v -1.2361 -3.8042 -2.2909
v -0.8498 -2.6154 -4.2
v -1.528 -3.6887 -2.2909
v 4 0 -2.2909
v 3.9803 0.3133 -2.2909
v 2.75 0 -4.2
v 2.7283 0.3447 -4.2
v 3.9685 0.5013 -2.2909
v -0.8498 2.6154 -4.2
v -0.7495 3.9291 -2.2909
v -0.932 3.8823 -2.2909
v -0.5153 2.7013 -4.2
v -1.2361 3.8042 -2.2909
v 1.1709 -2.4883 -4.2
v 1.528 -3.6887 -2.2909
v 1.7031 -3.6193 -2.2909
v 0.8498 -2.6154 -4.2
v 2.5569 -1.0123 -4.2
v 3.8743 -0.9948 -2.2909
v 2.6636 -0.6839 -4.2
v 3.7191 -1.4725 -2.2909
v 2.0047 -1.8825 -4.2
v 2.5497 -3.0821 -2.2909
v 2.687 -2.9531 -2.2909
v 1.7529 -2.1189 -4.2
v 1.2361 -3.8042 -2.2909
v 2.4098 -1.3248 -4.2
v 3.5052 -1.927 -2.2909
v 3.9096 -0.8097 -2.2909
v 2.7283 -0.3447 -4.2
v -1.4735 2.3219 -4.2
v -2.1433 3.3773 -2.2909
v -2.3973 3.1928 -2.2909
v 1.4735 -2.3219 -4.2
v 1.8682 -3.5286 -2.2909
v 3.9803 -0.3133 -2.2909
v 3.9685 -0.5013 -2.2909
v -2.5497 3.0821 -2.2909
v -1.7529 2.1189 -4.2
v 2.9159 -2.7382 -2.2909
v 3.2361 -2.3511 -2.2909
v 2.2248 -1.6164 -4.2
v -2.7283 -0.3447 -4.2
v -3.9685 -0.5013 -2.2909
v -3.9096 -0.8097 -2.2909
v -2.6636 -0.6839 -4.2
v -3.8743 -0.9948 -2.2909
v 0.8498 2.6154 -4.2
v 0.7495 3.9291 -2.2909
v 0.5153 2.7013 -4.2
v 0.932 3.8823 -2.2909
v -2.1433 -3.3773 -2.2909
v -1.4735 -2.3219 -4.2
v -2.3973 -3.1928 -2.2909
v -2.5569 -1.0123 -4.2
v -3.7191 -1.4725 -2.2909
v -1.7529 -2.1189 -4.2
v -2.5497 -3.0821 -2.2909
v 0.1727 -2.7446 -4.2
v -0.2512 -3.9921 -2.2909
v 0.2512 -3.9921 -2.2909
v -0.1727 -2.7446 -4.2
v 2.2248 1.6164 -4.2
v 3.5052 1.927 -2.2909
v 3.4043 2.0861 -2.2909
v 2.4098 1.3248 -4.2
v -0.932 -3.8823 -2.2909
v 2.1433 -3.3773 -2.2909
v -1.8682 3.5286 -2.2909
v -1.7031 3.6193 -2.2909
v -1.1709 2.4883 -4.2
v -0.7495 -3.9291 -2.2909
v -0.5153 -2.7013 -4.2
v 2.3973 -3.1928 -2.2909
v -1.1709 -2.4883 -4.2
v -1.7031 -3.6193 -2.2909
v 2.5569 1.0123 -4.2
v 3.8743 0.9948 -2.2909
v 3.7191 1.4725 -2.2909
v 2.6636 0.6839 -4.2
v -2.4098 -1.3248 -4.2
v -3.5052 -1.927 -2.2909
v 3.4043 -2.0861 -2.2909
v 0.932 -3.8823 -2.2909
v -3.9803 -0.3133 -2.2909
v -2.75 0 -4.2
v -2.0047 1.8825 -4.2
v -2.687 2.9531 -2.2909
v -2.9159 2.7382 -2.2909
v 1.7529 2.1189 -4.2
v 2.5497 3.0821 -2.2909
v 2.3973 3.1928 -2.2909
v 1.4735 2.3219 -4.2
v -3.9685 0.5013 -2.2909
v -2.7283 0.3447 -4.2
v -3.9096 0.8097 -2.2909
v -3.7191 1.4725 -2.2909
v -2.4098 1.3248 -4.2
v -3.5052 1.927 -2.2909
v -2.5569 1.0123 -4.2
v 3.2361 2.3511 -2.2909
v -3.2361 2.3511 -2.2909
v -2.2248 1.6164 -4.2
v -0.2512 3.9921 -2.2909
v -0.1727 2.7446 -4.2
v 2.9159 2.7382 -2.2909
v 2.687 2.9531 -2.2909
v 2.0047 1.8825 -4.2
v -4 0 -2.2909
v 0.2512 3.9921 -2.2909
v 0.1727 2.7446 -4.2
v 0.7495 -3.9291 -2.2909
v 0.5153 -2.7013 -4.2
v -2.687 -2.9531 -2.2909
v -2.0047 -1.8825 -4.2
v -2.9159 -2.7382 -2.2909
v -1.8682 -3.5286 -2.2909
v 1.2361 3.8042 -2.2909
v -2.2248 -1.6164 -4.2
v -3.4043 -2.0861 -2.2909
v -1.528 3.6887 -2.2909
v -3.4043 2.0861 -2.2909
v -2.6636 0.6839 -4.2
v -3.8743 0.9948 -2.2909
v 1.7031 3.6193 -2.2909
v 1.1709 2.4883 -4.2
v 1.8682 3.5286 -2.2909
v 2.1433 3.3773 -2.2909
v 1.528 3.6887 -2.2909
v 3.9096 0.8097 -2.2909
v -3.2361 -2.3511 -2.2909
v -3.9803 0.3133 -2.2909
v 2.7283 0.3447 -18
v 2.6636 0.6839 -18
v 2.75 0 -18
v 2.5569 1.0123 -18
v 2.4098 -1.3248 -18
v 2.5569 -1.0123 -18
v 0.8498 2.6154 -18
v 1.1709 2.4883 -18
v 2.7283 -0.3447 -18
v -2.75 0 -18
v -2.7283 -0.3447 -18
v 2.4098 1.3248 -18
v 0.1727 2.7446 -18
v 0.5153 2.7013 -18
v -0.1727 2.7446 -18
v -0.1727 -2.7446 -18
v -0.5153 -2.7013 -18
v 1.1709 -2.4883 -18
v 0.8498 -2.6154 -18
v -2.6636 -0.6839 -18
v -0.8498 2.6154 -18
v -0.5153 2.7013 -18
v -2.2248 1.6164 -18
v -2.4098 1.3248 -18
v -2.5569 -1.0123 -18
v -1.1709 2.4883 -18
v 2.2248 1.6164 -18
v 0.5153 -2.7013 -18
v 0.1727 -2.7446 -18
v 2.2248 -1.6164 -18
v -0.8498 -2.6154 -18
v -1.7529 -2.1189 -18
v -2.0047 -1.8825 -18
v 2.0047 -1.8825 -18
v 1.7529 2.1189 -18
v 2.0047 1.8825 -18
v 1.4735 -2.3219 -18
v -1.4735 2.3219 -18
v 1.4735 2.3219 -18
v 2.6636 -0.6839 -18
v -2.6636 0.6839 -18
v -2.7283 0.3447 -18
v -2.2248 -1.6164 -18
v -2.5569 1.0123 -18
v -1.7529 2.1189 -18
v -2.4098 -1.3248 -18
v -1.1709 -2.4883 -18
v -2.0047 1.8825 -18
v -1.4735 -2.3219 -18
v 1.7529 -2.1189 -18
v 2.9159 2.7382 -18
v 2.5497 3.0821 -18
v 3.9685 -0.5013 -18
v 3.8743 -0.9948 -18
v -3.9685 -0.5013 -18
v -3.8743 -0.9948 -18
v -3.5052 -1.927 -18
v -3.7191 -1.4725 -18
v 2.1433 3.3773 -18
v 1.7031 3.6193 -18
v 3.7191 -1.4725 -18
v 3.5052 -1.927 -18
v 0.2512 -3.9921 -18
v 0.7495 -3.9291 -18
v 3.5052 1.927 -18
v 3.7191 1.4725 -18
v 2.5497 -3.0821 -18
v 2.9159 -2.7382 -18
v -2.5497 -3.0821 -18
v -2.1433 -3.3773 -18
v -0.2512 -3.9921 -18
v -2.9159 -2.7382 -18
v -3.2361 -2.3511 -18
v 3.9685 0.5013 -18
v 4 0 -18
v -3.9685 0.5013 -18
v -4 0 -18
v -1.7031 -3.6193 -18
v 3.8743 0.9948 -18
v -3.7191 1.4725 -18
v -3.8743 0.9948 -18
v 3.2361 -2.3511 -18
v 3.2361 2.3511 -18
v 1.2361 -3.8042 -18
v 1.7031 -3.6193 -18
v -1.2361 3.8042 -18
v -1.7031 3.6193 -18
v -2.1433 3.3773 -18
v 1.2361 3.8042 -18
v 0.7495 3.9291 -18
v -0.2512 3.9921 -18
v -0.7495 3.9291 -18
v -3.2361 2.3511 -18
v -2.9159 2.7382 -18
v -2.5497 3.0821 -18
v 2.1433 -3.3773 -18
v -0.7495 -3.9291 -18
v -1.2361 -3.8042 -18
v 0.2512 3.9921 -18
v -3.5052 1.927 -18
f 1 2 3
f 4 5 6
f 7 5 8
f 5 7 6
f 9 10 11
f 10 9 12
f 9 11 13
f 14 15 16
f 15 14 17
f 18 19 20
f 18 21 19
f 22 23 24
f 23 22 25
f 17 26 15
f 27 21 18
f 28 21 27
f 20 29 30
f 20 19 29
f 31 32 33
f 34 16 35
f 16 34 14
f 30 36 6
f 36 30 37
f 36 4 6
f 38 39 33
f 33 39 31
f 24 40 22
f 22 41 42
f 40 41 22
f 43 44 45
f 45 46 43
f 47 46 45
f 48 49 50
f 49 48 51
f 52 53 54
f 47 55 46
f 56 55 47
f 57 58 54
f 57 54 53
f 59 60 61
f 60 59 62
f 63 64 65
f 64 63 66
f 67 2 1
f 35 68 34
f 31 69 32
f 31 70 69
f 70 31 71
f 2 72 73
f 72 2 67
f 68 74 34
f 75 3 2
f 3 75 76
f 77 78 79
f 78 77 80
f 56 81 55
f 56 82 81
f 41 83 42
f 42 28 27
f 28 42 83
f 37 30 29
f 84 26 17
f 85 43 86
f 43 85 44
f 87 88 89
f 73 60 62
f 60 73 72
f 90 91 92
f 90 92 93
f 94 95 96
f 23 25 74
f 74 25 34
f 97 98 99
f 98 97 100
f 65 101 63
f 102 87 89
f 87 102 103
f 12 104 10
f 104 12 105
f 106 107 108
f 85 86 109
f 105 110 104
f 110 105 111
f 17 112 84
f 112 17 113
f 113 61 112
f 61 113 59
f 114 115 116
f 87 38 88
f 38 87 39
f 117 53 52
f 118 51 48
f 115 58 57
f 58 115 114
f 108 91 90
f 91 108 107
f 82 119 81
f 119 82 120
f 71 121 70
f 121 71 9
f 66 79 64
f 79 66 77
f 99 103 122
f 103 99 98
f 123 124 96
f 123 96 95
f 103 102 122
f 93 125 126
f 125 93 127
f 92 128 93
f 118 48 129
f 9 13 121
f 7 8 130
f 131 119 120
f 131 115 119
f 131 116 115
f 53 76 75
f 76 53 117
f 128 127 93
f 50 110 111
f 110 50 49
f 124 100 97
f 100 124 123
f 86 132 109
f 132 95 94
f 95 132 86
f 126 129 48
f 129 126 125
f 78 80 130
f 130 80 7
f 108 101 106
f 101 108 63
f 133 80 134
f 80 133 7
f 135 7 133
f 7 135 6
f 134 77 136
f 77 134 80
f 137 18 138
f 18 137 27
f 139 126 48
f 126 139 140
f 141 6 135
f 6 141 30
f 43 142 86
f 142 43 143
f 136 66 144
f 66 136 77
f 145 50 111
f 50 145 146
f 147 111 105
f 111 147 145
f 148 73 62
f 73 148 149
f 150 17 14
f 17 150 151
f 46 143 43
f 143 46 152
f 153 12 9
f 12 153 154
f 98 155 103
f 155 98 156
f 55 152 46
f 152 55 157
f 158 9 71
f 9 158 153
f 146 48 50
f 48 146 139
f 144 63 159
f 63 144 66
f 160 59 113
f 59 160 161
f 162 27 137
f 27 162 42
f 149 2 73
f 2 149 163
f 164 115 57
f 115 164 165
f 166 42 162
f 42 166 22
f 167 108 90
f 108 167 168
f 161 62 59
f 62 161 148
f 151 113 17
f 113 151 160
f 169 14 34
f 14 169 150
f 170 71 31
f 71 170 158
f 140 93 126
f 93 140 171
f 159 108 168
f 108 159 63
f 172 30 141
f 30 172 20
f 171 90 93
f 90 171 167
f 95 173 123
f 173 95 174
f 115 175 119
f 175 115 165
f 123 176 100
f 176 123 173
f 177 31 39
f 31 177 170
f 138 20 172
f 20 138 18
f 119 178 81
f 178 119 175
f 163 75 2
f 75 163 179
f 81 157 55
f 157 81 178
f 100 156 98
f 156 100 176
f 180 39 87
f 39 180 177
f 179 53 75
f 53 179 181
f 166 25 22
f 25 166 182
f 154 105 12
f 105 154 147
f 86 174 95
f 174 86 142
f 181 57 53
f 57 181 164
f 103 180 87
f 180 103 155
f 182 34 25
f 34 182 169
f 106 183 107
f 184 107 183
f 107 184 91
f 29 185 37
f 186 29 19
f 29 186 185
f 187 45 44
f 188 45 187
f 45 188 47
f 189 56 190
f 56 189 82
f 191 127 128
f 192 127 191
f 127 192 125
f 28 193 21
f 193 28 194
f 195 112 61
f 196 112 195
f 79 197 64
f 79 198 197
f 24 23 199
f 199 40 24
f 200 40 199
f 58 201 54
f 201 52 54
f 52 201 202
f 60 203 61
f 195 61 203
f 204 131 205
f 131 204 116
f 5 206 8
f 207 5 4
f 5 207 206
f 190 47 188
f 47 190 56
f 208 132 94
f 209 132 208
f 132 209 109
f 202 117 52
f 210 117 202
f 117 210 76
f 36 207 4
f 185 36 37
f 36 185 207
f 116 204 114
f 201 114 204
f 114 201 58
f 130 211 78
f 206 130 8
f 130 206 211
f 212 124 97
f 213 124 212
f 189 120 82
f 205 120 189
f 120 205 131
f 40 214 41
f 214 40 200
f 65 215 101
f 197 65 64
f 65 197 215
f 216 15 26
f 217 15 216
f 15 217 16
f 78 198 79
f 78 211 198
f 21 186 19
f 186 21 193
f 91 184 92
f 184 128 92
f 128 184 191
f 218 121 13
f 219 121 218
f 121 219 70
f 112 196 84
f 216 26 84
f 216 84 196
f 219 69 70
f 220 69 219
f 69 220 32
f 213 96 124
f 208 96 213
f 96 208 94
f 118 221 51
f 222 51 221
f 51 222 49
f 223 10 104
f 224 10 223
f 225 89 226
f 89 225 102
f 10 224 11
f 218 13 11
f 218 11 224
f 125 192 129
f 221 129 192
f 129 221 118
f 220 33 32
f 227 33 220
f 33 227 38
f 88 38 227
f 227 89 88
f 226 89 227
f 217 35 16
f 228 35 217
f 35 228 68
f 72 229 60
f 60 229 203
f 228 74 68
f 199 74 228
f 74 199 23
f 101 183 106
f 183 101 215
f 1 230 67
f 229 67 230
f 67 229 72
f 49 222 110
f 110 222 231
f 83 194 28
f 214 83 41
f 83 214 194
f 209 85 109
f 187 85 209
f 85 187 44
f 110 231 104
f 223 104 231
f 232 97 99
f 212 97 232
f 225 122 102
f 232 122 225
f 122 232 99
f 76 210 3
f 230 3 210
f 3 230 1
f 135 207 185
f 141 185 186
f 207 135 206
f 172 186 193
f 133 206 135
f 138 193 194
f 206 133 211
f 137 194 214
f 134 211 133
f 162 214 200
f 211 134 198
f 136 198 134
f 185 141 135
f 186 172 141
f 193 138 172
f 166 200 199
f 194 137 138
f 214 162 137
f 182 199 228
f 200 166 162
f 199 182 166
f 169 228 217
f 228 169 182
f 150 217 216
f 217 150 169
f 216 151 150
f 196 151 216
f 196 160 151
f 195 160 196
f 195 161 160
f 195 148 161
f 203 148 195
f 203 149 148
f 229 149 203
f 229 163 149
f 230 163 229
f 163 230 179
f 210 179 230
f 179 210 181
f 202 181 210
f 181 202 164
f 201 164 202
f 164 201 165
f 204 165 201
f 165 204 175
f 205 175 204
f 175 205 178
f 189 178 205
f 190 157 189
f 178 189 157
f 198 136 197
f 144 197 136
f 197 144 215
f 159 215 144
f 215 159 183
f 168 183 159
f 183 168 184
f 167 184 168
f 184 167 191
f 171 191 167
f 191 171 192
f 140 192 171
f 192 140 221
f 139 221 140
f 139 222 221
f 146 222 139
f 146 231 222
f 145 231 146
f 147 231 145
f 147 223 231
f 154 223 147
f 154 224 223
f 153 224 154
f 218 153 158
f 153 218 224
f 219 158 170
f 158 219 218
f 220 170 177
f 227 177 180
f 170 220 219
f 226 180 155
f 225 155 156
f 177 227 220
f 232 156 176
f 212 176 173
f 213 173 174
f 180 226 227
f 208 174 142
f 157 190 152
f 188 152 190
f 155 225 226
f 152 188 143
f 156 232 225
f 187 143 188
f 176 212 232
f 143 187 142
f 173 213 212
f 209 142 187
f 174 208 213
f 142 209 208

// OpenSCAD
$fn = 50;

difference() {
	union() {
		translate(v = [0, 0, -18.0]) {
			cylinder(h = 21, r = 4.0);
		}
	}
	union() {
		translate(v = [0, 0, 0]) {
			rotate(a = [0, 0, 0]) {
				difference() {
					union() {
						translate(v = [0, 0, -21.0]) {
							cylinder(h = 21, r = 2.25);
						}
						translate(v = [0, 0, -4.2]) {
							cylinder(h = 4.2, r1 = 2.75, r2 = 5.5);
						}
						translate(v = [0, 0, -21.0]) {
							cylinder(h = 21, r = 2.75);
						}
						translate(v = [0, 0, -21.0]) {
							cylinder(h = 21, r = 2.25);
						}
					}
					union();
				}
			}
		}
		#cylinder(h = 3, r = 6.25);
	}
}
